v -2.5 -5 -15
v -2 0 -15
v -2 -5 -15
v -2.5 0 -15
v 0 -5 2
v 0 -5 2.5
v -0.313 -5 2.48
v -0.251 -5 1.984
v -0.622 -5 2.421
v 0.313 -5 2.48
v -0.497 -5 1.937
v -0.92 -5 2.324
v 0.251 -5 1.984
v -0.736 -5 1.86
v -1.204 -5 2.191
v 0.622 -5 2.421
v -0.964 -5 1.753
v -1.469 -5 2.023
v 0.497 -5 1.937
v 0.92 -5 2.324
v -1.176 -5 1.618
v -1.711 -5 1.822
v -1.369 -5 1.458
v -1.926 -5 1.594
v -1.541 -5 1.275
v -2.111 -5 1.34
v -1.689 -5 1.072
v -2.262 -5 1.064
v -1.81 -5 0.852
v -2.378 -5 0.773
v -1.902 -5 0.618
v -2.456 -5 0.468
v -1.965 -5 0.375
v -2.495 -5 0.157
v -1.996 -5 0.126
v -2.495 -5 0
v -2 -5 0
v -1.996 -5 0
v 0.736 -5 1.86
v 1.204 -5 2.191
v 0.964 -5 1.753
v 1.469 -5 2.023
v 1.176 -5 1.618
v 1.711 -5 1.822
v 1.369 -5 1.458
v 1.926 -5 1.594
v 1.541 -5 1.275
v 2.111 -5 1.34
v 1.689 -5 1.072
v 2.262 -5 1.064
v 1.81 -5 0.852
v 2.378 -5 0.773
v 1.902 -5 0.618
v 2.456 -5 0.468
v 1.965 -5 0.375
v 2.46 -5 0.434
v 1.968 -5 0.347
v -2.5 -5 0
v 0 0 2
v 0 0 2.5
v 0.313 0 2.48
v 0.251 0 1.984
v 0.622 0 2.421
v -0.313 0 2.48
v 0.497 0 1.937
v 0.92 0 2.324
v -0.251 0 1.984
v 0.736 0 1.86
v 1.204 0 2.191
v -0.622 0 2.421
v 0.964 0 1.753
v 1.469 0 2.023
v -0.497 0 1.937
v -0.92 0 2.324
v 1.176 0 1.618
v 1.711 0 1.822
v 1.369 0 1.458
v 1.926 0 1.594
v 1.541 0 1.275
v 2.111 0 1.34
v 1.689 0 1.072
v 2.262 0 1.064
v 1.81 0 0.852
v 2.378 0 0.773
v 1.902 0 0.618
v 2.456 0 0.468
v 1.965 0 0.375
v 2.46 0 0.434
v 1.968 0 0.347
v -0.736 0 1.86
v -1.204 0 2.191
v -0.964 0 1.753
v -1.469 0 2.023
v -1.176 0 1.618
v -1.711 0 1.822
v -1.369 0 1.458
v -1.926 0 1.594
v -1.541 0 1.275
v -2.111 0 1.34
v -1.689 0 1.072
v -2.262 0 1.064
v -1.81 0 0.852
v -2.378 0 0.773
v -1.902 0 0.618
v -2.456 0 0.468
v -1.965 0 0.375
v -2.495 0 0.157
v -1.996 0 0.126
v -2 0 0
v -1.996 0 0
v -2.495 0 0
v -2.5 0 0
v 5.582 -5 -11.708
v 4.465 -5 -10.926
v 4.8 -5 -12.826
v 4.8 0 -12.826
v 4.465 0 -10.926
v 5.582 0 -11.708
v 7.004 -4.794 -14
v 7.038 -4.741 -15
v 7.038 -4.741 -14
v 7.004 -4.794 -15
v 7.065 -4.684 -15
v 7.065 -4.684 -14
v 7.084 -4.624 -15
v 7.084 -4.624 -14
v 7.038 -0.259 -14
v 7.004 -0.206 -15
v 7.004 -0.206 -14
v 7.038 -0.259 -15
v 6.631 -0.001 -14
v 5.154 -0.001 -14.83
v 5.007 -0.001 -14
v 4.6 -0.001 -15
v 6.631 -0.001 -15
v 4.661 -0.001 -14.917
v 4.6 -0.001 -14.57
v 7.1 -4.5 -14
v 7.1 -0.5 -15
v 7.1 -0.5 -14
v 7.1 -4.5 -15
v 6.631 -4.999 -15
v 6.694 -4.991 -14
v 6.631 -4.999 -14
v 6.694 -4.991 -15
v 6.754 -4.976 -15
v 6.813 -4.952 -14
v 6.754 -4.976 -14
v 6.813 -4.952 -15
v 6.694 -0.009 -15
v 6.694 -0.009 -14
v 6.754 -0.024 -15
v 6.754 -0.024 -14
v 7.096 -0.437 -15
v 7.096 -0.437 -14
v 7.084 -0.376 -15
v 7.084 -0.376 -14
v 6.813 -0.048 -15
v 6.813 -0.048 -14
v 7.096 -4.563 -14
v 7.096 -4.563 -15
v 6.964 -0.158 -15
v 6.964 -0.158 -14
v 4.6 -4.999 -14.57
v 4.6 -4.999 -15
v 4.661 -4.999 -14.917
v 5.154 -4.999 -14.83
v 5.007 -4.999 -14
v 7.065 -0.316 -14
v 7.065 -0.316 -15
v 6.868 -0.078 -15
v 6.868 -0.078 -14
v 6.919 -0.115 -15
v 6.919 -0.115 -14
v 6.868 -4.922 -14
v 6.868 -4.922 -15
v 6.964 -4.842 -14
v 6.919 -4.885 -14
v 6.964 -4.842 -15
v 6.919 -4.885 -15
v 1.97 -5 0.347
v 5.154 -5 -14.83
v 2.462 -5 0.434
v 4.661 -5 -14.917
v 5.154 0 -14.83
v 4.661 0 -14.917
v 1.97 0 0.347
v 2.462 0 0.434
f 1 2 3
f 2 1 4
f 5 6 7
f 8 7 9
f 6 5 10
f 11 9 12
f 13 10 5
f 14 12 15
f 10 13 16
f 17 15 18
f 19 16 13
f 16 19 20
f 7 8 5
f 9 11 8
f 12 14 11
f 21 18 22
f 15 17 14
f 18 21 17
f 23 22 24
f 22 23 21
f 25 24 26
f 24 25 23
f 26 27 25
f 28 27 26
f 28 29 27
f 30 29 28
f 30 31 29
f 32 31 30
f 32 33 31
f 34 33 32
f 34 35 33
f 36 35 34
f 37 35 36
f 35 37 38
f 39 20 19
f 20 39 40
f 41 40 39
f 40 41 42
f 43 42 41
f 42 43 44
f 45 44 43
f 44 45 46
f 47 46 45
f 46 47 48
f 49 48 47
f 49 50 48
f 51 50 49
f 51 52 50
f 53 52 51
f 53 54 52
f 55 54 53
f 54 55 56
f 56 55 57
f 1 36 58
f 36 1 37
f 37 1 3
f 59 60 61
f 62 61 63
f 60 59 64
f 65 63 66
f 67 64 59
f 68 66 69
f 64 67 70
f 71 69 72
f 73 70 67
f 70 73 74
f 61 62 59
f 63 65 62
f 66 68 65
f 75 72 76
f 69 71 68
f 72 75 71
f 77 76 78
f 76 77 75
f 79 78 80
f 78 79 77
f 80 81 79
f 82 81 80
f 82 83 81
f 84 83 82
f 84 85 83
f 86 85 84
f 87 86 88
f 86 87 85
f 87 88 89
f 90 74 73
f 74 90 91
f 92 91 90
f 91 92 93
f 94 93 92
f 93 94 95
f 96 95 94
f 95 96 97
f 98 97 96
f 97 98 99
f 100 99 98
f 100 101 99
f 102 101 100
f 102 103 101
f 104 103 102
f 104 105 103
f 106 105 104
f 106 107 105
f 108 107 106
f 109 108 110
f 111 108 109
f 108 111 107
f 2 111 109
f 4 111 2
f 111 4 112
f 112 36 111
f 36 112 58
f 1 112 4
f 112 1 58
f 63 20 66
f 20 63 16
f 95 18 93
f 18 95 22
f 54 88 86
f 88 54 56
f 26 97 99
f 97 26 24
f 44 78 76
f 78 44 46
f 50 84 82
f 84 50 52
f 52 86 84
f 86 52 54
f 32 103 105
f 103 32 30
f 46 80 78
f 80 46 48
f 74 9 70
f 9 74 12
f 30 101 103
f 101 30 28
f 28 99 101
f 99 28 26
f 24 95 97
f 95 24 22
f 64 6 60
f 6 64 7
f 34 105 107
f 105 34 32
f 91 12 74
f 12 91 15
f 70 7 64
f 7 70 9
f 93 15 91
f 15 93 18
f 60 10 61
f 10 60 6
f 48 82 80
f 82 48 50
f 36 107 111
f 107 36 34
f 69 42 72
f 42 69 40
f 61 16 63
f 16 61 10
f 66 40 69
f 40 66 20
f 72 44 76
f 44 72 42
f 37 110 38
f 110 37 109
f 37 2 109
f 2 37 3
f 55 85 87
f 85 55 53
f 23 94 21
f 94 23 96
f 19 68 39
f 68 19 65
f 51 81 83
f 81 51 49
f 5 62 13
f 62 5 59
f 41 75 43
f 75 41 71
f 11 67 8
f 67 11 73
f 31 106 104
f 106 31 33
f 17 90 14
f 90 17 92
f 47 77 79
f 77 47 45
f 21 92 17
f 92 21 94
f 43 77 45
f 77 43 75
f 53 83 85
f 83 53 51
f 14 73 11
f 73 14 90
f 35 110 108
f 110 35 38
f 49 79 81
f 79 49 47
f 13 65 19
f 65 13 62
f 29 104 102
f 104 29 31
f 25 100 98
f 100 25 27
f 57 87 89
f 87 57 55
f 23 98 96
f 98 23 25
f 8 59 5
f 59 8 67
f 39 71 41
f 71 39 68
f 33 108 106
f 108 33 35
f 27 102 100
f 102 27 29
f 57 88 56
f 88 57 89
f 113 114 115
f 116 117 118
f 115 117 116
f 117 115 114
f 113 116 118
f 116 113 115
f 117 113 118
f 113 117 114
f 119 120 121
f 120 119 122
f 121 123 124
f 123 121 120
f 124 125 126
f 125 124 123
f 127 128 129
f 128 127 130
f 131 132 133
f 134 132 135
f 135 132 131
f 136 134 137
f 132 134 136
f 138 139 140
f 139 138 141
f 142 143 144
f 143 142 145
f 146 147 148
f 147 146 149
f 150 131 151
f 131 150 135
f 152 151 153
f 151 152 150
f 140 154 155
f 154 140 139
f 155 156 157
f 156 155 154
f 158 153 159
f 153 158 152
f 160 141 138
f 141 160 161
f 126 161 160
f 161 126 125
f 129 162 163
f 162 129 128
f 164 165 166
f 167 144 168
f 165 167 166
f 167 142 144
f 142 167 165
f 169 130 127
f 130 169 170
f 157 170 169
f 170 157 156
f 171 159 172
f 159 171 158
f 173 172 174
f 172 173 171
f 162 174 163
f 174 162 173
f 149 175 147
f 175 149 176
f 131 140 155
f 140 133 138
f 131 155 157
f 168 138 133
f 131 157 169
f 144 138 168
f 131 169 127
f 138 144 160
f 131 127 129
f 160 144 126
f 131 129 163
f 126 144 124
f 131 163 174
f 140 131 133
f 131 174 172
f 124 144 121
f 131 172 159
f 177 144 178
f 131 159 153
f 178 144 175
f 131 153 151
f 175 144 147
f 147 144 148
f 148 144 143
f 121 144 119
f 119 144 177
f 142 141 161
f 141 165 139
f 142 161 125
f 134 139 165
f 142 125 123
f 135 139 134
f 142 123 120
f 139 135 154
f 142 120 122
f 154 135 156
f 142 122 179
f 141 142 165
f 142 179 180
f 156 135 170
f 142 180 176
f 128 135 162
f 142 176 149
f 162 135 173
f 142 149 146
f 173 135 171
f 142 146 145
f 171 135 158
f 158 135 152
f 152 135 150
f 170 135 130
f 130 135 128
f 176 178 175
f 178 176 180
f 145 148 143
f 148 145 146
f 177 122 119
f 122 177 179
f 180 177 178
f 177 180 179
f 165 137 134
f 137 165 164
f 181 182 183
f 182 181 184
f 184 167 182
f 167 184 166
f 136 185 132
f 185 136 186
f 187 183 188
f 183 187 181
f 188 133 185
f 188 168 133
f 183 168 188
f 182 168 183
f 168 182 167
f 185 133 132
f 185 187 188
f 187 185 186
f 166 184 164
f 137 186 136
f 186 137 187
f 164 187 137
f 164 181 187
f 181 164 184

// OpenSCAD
$fn = 50;
rotate_d = 10;

module locker()
{
    
    r1 = 7;
    
    cylinder(8,5,5);
    cylinder(3,1,r1);
    translate([0,0,5])mirror([0,0,1])cylinder(2,1,r1);
    translate([0,0,2])cylinder(h= 1, r = r1);
    translate([0,0,8.5])cube([2,9,2],true)
    
    ;}
    
    
    
    
    
    
tip_lenght = 3;
thikness = 5;
width = 5;
height = 15;
    

    module the_tip(){
      {  difference(){
       translate([height-1,width/2+0.5,0.5])
       
       rotate([90,0,90]) linear_extrude(1)minkowski(){
       square([tip_lenght-1,thikness-1],false);
         
           
           
 //translate([height-1,(width/2)+tip_lenght,thikness/2])rotate([90,0,90])
            circle(r = 0.5);
        }
        
        
        translate([height-1-0.1,width/2-0.2,-0.1])rotate([90,0,90])linear_extrude(2)square([0.5+0.2,thikness+0.2]);
        }
       }}
       
    
       
   module latch(h = 10, width = width, thikness = thikness){
    union(){  
        
       translate([0,-width/2,0])cube([h,width,thikness]);
            cylinder(r =width/2,h = thikness);
       }
       }
       
       module lock_m(){
    
    
       difference()
       {latch(height, 5);
       translate([0,0,-0.1])latch(height*2,4,width+0.2);
           rotate([0,0,rotate_d])translate([0,-1,-1])cube([20,10,10]);
          translate([0,-1,-1]) cube([20,10,10]);
       }
       rotate([0,0,rotate_d])translate([3,0,0])difference(){
       translate([height-5.5,(width/2)+2,thikness/2])rotate([0,0,0])cube([7.3,4,thikness],true);
       translate([height-3,width-(0.5),thikness/2])rotate([0,0,45])cube([5,8,thikness*2],true);
       translate([height-8,width-(0.5),thikness/2])rotate([0,0,45])cube([8,5,thikness*2],true);
             
           
     }
       
       
       
       translate([0,-1+2.6,0])the_tip();
       
              rotate([0,0,rotate_d])translate([0,2,0])cube([height+0.5,0.5,width]);
       }
       
      // lock_m();
       
    translate([4.5,-2.5,-11.7])
       scale(1)translate([-4.5,2.5,11.7])rotate([90,90,0])lock_m();
 

       
